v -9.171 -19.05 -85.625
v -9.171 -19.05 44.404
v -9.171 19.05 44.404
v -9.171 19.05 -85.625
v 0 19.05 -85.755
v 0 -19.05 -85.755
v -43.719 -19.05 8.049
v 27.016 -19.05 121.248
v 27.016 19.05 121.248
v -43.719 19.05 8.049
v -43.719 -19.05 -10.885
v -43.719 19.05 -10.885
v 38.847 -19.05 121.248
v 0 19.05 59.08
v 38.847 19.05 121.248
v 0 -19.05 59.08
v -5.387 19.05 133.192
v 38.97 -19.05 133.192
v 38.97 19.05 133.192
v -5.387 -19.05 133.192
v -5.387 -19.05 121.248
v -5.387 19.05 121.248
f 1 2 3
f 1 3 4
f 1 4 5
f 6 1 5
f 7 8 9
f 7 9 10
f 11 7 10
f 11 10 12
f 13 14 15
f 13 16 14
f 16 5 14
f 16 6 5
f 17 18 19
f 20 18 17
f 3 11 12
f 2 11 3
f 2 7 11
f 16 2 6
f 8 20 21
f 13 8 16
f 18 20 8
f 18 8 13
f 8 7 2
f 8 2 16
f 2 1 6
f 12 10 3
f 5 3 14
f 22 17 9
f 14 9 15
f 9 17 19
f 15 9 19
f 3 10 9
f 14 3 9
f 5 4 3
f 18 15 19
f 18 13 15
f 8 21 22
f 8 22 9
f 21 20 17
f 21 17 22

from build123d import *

# Parameters (mm, degrees)
F1_DEPTH = 19.05


with BuildPart() as f1:
    # F0 (on Front) → F1 (new body, symmetric)
    with BuildSketch(Plane.XZ):
        Polygon((27.015501, 121.247835), (38.846832, 121.247835), (38.969941, 133.192345), (-5.387122, 133.192345), (-5.387122, 121.247835), align=None)
        Polygon((-9.170749, 44.403642), (0, 59.079908), (38.846832, 121.247835), (27.015501, 121.247835), (-43.718703, 8.049446), (-43.718703, -10.884642), align=None)
        Polygon((0, -85.755453), (0, 59.079908), (-9.170749, 44.403642), (-9.170749, -85.624769), align=None)
    extrude(amount=F1_DEPTH, both=True)


solid = f1.part
